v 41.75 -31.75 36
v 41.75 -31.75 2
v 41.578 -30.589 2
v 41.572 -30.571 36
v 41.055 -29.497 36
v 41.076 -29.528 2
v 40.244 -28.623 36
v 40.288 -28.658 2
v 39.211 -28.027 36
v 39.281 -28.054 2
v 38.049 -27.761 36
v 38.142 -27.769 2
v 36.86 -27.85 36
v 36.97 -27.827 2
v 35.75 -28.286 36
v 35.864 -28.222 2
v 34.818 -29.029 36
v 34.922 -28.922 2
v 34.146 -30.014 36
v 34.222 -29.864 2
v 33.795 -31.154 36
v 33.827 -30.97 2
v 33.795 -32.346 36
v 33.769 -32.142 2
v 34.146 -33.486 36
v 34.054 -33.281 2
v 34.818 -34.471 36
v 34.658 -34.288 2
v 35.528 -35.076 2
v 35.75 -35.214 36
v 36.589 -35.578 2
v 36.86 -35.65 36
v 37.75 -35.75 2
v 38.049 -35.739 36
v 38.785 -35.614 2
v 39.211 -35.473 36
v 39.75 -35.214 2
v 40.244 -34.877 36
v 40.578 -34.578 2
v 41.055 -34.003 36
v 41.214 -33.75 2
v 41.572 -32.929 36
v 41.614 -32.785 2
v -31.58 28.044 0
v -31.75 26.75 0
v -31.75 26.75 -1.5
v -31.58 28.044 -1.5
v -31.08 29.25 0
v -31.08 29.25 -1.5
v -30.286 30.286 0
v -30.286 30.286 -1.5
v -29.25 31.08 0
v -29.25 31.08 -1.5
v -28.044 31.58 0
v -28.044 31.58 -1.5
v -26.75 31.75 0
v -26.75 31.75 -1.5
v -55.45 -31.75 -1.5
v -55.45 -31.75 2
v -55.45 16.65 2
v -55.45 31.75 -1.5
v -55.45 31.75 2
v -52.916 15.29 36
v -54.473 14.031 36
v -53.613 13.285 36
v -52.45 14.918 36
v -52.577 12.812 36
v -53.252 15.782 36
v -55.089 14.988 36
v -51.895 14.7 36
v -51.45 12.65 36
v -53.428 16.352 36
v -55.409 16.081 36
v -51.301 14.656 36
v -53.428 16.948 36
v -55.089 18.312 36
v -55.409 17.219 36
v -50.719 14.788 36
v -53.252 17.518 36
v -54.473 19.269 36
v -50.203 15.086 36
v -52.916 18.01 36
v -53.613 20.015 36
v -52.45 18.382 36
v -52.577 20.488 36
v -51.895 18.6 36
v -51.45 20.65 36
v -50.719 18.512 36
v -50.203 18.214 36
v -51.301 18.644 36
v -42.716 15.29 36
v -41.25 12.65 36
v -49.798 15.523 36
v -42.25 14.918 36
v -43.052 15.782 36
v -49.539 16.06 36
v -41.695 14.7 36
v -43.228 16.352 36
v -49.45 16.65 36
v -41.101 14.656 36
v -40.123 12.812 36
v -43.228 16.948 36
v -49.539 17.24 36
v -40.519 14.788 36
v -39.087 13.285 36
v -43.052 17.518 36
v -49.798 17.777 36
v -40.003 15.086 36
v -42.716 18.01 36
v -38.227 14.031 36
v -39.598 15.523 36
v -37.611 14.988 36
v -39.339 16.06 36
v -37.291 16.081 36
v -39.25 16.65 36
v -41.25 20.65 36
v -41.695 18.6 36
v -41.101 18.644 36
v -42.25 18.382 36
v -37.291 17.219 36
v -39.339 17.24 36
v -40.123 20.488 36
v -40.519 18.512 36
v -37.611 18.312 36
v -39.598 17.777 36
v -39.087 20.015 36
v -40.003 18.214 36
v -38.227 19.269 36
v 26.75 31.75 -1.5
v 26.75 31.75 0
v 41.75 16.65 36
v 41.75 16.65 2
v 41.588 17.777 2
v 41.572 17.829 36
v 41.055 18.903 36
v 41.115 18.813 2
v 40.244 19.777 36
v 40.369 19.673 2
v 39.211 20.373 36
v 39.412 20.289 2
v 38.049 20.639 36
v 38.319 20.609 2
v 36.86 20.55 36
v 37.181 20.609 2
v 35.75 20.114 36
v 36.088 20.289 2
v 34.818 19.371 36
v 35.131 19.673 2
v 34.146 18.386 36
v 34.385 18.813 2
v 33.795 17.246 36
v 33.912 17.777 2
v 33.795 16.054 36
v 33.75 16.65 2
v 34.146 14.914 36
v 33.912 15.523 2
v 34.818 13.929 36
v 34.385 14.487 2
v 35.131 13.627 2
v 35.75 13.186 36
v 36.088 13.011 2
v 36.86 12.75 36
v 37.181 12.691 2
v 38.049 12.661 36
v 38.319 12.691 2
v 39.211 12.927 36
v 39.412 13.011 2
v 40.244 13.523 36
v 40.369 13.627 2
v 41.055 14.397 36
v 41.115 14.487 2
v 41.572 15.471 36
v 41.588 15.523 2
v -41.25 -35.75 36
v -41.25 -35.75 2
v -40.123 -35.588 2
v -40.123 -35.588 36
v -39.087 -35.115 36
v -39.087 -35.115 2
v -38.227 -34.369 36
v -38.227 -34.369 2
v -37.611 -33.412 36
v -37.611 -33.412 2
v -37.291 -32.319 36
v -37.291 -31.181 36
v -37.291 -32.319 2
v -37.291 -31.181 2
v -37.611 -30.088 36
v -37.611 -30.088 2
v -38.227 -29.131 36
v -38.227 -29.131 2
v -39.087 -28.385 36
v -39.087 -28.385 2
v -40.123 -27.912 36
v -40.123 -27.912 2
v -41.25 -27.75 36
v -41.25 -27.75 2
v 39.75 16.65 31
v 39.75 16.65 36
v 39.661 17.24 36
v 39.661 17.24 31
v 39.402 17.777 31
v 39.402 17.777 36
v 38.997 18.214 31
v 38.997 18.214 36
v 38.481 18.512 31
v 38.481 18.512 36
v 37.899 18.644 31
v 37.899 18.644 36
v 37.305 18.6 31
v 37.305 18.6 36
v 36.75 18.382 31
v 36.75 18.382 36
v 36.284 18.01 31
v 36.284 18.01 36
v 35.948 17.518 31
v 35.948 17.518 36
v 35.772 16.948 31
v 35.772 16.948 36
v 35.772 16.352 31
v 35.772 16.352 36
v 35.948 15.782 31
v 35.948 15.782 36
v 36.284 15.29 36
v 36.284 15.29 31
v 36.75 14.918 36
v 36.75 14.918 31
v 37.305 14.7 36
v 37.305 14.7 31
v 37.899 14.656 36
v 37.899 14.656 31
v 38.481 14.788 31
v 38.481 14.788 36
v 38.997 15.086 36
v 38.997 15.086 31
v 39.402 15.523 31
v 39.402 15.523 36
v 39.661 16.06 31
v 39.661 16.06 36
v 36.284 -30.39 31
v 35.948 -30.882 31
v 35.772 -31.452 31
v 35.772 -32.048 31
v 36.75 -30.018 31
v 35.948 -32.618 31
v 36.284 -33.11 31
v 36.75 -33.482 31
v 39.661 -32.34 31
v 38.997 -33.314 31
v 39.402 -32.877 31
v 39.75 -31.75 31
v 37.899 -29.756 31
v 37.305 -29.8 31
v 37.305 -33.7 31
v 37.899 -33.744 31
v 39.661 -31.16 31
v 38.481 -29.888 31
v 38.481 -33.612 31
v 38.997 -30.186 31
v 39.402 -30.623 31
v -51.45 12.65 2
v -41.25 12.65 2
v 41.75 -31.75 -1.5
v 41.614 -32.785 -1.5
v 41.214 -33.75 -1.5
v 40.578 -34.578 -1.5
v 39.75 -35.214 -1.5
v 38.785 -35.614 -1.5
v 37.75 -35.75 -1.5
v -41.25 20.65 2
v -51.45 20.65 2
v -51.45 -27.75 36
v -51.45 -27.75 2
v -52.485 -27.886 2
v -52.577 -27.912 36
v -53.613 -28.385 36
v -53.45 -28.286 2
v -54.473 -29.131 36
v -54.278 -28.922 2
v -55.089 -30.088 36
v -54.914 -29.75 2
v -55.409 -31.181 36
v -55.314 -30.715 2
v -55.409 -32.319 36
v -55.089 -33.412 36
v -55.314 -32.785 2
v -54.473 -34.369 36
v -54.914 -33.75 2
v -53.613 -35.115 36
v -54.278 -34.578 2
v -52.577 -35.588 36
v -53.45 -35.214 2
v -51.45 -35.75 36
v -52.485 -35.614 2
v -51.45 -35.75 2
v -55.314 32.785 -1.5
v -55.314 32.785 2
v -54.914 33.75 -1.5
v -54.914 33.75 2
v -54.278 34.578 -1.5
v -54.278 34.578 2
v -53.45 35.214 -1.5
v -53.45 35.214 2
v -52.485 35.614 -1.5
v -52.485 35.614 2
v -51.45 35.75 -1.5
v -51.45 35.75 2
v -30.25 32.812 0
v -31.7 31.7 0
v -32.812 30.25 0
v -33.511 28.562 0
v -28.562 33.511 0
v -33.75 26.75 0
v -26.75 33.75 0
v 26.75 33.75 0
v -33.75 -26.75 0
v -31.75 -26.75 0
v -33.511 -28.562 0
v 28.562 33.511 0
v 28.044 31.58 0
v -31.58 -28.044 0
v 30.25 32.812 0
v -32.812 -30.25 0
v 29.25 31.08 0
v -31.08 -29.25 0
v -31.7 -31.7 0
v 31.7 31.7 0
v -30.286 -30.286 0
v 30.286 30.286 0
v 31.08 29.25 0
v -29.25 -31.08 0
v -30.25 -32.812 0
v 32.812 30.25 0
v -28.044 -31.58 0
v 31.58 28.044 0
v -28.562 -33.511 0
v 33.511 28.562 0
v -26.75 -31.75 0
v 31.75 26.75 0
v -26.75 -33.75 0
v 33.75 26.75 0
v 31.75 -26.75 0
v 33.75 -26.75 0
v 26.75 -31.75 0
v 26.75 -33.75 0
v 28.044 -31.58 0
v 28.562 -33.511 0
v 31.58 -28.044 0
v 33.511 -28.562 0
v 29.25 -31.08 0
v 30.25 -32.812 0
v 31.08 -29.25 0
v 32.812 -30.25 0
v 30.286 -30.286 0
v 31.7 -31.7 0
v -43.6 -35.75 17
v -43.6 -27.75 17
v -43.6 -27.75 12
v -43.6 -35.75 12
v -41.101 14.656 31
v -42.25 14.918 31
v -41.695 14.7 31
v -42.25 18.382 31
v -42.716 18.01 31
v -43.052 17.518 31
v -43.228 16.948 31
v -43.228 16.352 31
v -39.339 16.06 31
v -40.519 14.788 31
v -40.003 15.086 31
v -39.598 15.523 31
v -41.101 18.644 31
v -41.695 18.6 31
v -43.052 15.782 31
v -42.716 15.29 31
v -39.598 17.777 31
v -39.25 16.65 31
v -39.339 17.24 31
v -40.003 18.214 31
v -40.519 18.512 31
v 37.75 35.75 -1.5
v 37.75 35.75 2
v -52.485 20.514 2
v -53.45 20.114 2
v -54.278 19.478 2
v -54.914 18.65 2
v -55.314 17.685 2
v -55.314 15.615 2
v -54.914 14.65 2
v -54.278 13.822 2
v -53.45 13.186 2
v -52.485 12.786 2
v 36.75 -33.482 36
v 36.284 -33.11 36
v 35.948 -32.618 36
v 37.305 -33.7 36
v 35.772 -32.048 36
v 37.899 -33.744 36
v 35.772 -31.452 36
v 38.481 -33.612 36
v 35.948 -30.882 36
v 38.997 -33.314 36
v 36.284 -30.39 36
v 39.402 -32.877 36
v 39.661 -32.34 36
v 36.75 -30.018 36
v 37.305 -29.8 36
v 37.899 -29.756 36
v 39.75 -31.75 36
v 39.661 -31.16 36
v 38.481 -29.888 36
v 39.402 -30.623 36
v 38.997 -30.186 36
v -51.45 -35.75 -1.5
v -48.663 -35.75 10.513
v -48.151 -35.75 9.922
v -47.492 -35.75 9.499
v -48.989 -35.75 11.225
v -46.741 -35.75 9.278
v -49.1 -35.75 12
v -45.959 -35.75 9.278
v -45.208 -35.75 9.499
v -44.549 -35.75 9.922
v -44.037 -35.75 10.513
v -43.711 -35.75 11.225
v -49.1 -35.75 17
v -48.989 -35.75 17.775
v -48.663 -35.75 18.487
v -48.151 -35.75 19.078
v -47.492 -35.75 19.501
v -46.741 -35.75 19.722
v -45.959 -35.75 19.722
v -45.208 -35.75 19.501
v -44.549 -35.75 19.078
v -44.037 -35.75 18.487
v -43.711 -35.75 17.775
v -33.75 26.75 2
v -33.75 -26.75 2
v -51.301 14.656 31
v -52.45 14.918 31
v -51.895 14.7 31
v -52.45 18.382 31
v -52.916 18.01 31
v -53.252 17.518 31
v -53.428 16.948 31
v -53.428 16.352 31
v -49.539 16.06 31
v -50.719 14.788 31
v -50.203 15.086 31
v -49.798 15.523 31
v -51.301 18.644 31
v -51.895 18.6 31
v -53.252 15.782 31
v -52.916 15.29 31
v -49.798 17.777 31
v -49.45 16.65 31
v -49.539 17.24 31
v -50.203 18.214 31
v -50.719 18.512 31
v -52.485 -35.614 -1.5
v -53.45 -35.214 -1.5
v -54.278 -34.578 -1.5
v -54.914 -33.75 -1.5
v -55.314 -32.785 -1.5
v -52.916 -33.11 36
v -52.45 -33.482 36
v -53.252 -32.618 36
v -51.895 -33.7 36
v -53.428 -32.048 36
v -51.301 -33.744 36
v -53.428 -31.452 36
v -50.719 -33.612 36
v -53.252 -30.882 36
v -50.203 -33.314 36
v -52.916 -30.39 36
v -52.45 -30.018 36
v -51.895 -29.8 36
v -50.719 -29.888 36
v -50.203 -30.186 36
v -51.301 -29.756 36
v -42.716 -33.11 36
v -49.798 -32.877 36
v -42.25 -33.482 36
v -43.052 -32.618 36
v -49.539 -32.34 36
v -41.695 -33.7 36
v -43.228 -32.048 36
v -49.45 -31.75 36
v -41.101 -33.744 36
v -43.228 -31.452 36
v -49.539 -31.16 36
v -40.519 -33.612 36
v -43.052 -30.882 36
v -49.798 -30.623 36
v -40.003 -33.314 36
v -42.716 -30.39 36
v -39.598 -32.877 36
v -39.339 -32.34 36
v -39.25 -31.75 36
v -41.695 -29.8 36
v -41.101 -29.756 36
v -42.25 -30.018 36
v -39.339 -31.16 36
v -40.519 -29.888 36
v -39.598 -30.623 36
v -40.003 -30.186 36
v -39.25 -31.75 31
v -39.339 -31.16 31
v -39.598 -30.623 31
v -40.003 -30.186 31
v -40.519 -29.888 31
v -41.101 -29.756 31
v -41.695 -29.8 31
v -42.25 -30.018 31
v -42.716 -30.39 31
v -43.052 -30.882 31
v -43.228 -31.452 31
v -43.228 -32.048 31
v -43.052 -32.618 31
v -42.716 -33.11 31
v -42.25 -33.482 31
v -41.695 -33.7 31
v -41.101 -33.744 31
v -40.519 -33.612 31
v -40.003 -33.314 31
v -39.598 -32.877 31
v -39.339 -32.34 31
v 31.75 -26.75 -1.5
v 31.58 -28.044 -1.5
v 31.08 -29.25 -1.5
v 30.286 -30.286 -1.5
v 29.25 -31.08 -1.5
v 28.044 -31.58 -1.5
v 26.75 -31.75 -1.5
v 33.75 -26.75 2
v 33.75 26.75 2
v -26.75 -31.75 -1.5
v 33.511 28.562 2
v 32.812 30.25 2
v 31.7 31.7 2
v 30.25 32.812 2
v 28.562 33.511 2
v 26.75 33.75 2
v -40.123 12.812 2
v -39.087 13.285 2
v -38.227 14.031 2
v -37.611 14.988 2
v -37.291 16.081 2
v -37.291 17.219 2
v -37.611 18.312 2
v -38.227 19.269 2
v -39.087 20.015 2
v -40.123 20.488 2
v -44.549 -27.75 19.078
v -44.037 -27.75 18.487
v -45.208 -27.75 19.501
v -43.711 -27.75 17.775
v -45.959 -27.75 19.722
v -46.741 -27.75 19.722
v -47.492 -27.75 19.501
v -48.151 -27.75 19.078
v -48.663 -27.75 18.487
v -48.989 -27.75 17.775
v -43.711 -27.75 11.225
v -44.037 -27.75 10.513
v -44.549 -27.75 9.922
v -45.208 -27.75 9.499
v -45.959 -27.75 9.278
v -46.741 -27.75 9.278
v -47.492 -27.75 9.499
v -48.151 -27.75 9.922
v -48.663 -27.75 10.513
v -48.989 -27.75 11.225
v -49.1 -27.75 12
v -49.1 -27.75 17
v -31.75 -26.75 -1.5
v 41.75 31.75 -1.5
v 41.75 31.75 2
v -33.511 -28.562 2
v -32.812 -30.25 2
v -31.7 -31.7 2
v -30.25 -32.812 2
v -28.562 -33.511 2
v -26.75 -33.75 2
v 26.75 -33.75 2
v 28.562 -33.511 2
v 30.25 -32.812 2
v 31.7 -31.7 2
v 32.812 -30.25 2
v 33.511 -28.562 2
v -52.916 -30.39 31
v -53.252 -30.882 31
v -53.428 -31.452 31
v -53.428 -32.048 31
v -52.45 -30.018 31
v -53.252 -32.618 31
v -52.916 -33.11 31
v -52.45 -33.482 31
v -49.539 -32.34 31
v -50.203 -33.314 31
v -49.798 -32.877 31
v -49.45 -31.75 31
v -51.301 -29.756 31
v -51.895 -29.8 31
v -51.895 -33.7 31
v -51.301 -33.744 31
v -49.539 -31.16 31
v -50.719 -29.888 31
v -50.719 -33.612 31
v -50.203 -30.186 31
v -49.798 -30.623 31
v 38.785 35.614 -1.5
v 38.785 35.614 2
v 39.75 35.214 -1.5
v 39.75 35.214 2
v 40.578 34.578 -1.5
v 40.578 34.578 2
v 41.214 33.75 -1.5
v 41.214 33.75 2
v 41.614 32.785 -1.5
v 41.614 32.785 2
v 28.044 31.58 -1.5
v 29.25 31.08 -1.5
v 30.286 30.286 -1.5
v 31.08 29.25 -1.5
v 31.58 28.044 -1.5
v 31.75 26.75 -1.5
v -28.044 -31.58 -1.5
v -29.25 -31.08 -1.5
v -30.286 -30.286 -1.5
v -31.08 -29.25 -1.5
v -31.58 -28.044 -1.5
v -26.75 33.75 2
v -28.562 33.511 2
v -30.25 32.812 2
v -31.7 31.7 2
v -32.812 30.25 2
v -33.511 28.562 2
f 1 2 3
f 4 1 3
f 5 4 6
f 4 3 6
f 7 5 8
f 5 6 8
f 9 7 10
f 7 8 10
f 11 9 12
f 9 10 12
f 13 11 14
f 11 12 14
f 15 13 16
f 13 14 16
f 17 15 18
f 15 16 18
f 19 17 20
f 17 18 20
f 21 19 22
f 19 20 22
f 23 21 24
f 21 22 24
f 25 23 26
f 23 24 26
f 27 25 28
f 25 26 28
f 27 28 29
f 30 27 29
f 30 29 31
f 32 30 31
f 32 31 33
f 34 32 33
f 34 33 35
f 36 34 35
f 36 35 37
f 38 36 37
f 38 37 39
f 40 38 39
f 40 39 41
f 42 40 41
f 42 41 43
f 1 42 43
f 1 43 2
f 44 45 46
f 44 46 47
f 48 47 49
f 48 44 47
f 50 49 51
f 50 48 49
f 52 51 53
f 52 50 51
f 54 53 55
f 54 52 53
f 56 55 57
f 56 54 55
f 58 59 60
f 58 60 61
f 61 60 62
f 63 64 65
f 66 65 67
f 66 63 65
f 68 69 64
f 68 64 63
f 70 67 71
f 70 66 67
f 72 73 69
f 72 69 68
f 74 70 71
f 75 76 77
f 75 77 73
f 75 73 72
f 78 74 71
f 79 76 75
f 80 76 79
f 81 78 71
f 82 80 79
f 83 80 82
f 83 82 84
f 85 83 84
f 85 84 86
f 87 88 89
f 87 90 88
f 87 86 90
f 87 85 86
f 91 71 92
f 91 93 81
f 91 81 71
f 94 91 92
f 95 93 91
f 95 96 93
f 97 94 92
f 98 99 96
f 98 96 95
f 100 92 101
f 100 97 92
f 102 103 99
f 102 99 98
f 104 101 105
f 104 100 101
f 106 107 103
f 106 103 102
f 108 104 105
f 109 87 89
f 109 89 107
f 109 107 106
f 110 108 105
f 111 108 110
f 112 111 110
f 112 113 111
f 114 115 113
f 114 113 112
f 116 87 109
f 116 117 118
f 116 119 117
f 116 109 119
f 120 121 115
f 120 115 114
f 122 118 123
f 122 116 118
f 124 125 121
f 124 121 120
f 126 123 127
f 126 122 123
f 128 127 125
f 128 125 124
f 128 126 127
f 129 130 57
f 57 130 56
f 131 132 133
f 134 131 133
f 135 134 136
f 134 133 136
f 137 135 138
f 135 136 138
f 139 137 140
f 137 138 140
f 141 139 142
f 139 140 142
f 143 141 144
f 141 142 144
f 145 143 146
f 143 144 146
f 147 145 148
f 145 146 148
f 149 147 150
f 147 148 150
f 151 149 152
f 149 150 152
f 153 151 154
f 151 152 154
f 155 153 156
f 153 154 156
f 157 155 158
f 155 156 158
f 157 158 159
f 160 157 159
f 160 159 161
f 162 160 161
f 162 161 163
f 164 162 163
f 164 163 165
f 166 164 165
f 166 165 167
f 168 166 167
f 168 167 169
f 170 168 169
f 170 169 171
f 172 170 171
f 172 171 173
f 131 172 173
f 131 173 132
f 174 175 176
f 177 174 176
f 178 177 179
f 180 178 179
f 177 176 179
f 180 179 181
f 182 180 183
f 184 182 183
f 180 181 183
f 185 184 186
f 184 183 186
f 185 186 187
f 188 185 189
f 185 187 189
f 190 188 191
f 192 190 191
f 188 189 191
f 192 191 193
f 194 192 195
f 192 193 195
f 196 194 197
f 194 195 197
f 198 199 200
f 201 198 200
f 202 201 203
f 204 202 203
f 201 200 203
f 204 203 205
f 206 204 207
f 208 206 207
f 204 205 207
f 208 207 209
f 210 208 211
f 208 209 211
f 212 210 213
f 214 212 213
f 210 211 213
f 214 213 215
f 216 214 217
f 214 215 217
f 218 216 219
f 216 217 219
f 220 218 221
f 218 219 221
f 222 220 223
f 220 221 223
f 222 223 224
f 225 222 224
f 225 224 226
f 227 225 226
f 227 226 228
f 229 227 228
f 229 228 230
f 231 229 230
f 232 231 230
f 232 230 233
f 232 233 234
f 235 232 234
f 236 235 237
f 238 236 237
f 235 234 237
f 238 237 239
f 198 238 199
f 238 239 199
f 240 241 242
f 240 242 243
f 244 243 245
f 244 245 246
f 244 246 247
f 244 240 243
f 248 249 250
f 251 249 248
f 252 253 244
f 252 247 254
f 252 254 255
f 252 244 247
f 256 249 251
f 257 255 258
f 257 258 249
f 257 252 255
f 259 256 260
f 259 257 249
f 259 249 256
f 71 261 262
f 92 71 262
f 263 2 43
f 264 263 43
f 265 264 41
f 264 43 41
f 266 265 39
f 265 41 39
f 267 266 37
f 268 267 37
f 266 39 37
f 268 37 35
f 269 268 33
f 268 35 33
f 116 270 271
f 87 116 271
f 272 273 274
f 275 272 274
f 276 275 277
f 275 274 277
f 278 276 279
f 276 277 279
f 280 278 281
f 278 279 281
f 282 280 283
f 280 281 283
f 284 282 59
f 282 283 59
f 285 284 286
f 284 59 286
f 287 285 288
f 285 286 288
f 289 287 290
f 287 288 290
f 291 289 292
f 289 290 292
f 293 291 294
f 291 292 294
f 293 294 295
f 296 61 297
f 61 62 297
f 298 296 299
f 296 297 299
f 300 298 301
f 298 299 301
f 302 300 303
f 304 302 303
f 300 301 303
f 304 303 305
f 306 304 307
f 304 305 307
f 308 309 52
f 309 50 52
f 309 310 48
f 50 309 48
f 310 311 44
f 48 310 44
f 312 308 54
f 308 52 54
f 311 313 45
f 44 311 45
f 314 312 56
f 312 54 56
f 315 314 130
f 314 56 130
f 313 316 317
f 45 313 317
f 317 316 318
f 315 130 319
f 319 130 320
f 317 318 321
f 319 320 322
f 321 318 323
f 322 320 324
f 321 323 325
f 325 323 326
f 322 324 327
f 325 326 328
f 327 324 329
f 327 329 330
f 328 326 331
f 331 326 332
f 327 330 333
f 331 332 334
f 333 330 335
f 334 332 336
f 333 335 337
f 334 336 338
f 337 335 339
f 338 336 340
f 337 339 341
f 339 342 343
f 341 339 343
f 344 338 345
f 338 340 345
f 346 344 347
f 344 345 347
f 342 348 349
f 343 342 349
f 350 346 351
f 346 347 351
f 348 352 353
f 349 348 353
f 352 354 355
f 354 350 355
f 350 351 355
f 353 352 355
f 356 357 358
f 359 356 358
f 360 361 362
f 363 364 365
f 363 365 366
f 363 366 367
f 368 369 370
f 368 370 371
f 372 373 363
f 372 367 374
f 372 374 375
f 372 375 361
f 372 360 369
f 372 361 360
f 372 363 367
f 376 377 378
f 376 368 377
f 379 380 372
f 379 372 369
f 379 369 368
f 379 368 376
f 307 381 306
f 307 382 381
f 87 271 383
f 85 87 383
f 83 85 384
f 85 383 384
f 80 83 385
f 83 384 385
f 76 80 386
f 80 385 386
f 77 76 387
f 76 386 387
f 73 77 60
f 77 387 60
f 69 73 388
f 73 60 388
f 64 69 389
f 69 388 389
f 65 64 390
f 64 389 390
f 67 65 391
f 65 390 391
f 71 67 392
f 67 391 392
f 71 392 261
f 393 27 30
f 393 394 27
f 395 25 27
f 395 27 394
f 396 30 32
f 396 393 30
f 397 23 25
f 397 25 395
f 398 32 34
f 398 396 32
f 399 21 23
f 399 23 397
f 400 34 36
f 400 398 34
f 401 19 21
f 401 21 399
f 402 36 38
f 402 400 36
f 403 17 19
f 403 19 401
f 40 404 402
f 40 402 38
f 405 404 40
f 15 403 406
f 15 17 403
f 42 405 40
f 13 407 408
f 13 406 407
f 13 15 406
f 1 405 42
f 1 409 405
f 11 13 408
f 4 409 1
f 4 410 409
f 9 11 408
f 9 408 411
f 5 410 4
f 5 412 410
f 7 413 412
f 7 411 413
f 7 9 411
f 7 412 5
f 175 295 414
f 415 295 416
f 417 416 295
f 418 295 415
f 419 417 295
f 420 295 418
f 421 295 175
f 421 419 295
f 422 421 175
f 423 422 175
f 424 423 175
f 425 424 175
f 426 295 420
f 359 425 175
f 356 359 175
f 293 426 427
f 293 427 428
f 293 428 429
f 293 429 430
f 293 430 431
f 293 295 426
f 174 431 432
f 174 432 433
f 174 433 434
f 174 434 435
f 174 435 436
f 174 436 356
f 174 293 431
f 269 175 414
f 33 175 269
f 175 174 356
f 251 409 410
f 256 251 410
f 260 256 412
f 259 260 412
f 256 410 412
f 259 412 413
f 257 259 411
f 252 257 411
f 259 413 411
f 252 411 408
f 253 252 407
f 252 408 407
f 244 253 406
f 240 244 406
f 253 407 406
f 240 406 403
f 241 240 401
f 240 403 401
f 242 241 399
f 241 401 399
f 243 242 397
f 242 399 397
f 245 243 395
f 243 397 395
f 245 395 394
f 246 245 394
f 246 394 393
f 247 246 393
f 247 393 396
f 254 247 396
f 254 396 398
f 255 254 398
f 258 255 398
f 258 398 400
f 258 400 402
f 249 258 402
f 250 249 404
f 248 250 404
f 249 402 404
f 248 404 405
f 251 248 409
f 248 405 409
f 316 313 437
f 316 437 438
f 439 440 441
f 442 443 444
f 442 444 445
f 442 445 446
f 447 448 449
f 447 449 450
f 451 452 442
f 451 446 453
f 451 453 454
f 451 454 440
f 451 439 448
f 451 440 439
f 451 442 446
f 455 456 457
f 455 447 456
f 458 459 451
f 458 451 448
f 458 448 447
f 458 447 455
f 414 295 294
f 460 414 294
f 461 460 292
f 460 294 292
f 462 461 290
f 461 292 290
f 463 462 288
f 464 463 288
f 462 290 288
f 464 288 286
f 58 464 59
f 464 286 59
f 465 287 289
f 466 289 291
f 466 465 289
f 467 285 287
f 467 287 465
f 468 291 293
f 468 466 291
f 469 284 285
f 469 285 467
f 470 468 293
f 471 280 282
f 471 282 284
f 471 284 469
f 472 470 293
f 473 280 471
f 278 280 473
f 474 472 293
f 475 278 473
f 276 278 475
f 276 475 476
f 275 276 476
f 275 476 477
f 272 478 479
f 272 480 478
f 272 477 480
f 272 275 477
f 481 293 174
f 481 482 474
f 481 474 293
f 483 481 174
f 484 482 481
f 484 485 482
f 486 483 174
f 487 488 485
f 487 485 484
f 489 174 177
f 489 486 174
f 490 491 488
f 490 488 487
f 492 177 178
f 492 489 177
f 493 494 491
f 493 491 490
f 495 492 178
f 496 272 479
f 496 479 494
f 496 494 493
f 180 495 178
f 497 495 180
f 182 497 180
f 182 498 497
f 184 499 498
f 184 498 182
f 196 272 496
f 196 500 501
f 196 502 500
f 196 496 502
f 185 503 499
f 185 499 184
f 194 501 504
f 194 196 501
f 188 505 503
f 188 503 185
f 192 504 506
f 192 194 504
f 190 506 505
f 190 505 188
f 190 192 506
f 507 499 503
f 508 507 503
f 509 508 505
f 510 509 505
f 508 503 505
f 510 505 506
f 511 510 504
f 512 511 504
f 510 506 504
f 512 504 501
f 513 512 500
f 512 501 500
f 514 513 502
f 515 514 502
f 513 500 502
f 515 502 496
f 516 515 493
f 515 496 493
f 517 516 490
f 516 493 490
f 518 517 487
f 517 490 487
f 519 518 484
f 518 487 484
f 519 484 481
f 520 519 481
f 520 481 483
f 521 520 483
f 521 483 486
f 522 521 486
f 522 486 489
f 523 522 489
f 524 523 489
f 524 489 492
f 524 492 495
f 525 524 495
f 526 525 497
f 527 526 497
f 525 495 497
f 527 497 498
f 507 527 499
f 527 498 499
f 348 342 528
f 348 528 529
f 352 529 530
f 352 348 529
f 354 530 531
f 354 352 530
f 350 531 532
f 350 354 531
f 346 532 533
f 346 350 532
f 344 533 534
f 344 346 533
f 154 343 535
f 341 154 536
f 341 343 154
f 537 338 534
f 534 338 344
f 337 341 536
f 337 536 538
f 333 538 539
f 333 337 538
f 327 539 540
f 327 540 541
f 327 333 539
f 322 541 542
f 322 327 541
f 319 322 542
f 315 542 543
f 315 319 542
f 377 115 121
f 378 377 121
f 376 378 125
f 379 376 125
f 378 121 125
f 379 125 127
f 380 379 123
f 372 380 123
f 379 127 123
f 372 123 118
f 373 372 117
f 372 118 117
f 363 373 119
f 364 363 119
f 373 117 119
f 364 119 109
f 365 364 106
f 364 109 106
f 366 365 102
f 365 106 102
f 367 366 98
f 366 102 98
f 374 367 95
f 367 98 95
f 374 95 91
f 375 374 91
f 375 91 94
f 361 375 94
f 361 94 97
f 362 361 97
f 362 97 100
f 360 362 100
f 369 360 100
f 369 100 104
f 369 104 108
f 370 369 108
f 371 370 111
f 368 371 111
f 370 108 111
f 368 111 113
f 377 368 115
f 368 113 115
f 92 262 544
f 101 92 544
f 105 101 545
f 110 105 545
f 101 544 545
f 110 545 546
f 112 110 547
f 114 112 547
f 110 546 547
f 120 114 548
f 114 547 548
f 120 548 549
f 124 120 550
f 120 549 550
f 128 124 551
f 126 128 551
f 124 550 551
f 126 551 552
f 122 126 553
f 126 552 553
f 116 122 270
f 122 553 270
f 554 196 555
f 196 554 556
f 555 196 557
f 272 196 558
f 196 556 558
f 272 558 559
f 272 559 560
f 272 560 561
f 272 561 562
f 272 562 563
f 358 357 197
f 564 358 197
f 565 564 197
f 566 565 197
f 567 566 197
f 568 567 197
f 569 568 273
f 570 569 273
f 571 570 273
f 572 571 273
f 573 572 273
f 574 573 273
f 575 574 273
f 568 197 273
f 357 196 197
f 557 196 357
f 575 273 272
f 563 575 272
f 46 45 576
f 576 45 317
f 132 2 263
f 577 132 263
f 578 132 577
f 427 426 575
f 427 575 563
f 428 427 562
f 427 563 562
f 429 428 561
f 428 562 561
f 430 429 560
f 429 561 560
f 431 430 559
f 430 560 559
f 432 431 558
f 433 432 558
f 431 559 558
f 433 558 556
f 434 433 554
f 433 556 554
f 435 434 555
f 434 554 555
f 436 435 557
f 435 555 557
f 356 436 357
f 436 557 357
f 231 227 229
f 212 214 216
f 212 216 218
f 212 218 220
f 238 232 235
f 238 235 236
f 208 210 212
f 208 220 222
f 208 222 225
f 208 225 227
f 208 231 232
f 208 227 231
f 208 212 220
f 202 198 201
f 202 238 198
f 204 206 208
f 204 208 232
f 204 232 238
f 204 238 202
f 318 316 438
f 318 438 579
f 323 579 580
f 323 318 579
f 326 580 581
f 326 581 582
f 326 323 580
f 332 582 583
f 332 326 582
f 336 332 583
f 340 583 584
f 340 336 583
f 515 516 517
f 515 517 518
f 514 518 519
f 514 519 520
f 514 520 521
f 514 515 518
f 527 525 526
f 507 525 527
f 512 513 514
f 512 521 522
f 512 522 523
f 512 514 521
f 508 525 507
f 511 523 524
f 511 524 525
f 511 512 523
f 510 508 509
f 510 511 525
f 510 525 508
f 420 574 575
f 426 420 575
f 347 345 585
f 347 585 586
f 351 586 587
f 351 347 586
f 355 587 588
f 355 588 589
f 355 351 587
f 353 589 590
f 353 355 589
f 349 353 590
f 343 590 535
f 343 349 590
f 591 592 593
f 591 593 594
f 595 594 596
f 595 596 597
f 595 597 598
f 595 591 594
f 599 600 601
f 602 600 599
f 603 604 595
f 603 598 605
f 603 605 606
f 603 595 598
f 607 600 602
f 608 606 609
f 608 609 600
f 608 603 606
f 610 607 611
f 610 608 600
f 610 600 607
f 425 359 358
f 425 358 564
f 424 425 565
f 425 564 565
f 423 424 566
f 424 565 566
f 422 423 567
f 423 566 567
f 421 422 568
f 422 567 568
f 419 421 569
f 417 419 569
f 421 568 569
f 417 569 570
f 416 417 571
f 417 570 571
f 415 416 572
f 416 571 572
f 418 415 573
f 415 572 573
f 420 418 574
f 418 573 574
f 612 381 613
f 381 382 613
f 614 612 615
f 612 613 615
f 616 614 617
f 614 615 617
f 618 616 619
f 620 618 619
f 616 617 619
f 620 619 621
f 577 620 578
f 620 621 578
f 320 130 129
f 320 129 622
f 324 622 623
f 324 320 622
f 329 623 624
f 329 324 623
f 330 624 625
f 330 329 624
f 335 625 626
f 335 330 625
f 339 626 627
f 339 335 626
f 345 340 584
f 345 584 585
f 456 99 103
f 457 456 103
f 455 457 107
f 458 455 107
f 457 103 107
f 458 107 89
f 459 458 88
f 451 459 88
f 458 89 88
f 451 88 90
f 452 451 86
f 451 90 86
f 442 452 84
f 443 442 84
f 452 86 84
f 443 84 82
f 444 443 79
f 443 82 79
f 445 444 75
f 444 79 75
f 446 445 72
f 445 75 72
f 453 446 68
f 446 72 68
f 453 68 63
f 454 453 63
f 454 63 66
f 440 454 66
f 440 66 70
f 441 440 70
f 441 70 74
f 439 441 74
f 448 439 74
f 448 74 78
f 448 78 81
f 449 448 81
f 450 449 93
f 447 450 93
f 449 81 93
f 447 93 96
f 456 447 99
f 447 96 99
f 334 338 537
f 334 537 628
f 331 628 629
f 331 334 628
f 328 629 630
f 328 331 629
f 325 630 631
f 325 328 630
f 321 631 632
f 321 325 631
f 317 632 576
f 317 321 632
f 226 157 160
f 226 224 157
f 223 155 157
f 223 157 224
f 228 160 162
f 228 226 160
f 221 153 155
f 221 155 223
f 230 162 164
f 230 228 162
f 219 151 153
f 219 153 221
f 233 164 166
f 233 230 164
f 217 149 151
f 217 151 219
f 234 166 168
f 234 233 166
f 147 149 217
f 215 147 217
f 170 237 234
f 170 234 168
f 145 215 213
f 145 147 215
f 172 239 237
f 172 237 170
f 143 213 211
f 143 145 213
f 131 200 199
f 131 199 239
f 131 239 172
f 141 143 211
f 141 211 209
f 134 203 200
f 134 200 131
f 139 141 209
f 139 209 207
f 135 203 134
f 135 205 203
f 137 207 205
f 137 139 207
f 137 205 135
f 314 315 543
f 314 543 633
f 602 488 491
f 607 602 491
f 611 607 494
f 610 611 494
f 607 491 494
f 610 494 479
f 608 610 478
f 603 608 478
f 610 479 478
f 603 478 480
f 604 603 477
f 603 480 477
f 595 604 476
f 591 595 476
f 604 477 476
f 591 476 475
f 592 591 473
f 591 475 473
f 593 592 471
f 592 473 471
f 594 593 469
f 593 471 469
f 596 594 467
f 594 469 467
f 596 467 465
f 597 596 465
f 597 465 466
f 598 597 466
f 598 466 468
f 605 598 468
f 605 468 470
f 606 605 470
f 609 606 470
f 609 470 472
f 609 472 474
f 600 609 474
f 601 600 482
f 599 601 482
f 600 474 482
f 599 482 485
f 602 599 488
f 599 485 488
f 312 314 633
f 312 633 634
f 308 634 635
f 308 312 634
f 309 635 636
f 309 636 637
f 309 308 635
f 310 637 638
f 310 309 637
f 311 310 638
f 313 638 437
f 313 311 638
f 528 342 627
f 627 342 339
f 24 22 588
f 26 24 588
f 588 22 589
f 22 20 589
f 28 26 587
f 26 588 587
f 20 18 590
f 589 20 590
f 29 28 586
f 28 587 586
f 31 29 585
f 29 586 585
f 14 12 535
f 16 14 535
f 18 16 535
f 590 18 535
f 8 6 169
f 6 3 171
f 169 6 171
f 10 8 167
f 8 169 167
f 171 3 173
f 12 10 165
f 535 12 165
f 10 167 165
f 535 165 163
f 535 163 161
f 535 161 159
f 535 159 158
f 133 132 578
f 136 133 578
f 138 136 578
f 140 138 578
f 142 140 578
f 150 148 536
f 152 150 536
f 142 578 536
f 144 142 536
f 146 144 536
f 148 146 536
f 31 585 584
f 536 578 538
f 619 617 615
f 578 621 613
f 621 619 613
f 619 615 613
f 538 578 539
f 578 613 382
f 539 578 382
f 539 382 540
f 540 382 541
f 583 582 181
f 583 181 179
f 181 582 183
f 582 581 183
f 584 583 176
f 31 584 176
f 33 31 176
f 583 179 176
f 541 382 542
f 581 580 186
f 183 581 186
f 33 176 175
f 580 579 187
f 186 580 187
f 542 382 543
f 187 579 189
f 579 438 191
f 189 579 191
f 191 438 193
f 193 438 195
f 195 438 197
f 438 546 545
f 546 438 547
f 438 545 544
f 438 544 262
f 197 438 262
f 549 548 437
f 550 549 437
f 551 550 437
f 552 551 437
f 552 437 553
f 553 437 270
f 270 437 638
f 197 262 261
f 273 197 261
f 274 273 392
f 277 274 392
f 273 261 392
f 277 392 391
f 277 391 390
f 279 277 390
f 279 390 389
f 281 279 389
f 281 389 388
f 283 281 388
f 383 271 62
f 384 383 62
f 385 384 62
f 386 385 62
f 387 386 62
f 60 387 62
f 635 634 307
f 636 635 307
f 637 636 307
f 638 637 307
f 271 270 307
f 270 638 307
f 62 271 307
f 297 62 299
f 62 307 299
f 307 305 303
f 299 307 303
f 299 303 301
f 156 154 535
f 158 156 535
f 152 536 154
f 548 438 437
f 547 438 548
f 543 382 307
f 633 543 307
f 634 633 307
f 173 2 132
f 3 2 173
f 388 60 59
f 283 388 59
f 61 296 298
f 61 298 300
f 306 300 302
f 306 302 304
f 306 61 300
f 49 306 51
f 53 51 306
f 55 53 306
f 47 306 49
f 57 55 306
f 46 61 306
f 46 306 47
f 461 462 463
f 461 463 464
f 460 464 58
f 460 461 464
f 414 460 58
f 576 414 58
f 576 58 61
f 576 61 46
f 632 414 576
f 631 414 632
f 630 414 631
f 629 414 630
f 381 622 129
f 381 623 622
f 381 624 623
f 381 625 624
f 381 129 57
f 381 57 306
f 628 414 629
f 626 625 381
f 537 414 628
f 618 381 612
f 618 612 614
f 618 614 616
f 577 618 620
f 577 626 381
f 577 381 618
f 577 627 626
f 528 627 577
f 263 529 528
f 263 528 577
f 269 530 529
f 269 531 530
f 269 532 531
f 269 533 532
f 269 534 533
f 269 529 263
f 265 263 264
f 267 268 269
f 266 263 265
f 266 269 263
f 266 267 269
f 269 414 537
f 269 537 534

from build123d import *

# Parameters (mm, degrees)
PAD_DEPTH       = 2
PAD001_DEPTH    = 1.5
SKETCH002_R     = 4
PAD002_DEPTH    = 34
POCKET_DEPTH    = 8.001
SKETCH009_R     = 2
POCKET003_DEPTH = 5


with BuildPart() as part:
    # Sketch → Pad (new body)
    with BuildSketch(Plane.XY):
        with BuildLine():
            Line((-51.45, 35.75), (37.75, 35.75))
            ThreePointArc((41.75, 31.75), (40.578427, 34.578427), (37.75, 35.75))
            Line((41.75, 31.75), (41.75, -31.75))
            ThreePointArc((37.75, -35.75), (40.578427, -34.578427), (41.75, -31.75))
            Line((37.75, -35.75), (-51.45, -35.75))
            ThreePointArc((-55.45, -31.75), (-54.278427, -34.578427), (-51.45, -35.75))
            Line((-55.45, -31.75), (-55.45, 31.75))
            ThreePointArc((-51.45, 35.75), (-54.278427, 34.578427), (-55.45, 31.75))
        make_face()
        with BuildLine():
            Line((-26.75, -33.75), (26.75, -33.75))
            ThreePointArc((26.75, -33.75), (31.699747, -31.699747), (33.75, -26.75))
            Line((33.75, -26.75), (33.75, 26.75))
            ThreePointArc((33.75, 26.75), (31.699747, 31.699747), (26.75, 33.75))
            Line((26.75, 33.75), (-26.75, 33.75))
            ThreePointArc((-26.75, 33.75), (-31.699747, 31.699747), (-33.75, 26.75))
            Line((-33.75, 26.75), (-33.75, -26.75))
            ThreePointArc((-33.75, -26.75), (-31.699747, -31.699747), (-26.75, -33.75))
        make_face(mode=Mode.SUBTRACT)
    extrude(amount=PAD_DEPTH)

    # Sketch001 (on Face17 of Pad) → Pad001 (join)
    with BuildSketch(Plane(origin=(0, 0, 0), x_dir=(1, 0, 0), z_dir=(0, 0, -1))):
        with BuildLine():
            ThreePointArc((-51.45, 35.75), (-54.278427, 34.578427), (-55.45, 31.75))
            Line((-55.45, 31.75), (-55.45, -31.75))
            ThreePointArc((-55.45, -31.75), (-54.278427, -34.578427), (-51.45, -35.75))
            Line((37.75, -35.75), (-51.45, -35.75))
            ThreePointArc((37.75, -35.75), (40.578427, -34.578427), (41.75, -31.75))
            Line((41.75, 31.75), (41.75, -31.75))
            ThreePointArc((41.75, 31.75), (40.578427, 34.578427), (37.75, 35.75))
            Line((-51.45, 35.75), (37.75, 35.75))
        make_face()
        with BuildLine():
            ThreePointArc((-26.75, 31.75), (-30.285534, 30.285534), (-31.75, 26.75))
            Line((-31.75, -26.75), (-31.75, 26.75))
            ThreePointArc((-31.75, -26.75), (-30.285534, -30.285534), (-26.75, -31.75))
            Line((26.75, -31.75), (-26.75, -31.75))
            ThreePointArc((26.75, -31.75), (30.285534, -30.285534), (31.75, -26.75))
            Line((31.75, 26.75), (31.75, -26.75))
            ThreePointArc((31.75, 26.75), (30.285534, 30.285534), (26.75, 31.75))
            Line((-26.75, 31.75), (26.75, 31.75))
        make_face(mode=Mode.SUBTRACT)
    extrude(amount=PAD001_DEPTH)

    # Sketch002 (on Face5 of Pad001) → Pad002 (join)
    with BuildSketch(Plane.XY.offset(2)):
        with Locations((37.75, -31.75)):
            Circle(SKETCH002_R)
        with Locations((37.75, 16.65)):
            Circle(SKETCH002_R)
        with BuildLine():
            ThreePointArc((-51.45, 20.65), (-55.45, 16.65), (-51.45, 12.65))
            Line((-51.45, 12.65), (-41.25, 12.65))
            ThreePointArc((-41.25, 12.65), (-37.25, 16.65), (-41.25, 20.65))
            Line((-41.25, 20.65), (-51.45, 20.65))
        make_face()
        with BuildLine():
            ThreePointArc((-41.25, -35.75), (-37.25, -31.75), (-41.25, -27.75))
            Line((-41.25, -27.75), (-51.45, -27.75))
            ThreePointArc((-51.45, -27.75), (-55.45, -31.75), (-51.45, -35.75))
            Line((-51.45, -35.75), (-41.25, -35.75))
        make_face()
    extrude(amount=PAD002_DEPTH)

    # Sketch003 (on Face16 of Pad002) → Pocket (cut, through all)
    with BuildSketch(Plane(origin=(0, -27.75, 0), x_dir=(-1, 0, 0), z_dir=(0, 1, 0))):
        with BuildLine():
            ThreePointArc((43.6, 12), (46.35, 9.25), (49.1, 12))
            Line((49.1, 12), (49.1, 17))
            ThreePointArc((49.1, 17), (46.35, 19.75), (43.6, 17))
            Line((43.6, 17), (43.6, 12))
        make_face()
    extrude(amount=-POCKET_DEPTH, mode=Mode.SUBTRACT)

    # Sketch009 (on Face33 of Pocket) → Pocket003 (cut)
    with BuildSketch(Plane.XY.offset(36)):
        with Locations((-51.45, 16.65)):
            Circle(SKETCH009_R)
        with Locations((-41.25, 16.65)):
            Circle(SKETCH009_R)
        with Locations((37.75, 16.65)):
            Circle(SKETCH009_R)
        with Locations((37.75, -31.75)):
            Circle(SKETCH009_R)
        with Locations((-41.25, -31.75)):
            Circle(SKETCH009_R)
        with Locations((-51.45, -31.75)):
            Circle(SKETCH009_R)
    extrude(amount=-POCKET003_DEPTH, mode=Mode.SUBTRACT)


solid = part.part
